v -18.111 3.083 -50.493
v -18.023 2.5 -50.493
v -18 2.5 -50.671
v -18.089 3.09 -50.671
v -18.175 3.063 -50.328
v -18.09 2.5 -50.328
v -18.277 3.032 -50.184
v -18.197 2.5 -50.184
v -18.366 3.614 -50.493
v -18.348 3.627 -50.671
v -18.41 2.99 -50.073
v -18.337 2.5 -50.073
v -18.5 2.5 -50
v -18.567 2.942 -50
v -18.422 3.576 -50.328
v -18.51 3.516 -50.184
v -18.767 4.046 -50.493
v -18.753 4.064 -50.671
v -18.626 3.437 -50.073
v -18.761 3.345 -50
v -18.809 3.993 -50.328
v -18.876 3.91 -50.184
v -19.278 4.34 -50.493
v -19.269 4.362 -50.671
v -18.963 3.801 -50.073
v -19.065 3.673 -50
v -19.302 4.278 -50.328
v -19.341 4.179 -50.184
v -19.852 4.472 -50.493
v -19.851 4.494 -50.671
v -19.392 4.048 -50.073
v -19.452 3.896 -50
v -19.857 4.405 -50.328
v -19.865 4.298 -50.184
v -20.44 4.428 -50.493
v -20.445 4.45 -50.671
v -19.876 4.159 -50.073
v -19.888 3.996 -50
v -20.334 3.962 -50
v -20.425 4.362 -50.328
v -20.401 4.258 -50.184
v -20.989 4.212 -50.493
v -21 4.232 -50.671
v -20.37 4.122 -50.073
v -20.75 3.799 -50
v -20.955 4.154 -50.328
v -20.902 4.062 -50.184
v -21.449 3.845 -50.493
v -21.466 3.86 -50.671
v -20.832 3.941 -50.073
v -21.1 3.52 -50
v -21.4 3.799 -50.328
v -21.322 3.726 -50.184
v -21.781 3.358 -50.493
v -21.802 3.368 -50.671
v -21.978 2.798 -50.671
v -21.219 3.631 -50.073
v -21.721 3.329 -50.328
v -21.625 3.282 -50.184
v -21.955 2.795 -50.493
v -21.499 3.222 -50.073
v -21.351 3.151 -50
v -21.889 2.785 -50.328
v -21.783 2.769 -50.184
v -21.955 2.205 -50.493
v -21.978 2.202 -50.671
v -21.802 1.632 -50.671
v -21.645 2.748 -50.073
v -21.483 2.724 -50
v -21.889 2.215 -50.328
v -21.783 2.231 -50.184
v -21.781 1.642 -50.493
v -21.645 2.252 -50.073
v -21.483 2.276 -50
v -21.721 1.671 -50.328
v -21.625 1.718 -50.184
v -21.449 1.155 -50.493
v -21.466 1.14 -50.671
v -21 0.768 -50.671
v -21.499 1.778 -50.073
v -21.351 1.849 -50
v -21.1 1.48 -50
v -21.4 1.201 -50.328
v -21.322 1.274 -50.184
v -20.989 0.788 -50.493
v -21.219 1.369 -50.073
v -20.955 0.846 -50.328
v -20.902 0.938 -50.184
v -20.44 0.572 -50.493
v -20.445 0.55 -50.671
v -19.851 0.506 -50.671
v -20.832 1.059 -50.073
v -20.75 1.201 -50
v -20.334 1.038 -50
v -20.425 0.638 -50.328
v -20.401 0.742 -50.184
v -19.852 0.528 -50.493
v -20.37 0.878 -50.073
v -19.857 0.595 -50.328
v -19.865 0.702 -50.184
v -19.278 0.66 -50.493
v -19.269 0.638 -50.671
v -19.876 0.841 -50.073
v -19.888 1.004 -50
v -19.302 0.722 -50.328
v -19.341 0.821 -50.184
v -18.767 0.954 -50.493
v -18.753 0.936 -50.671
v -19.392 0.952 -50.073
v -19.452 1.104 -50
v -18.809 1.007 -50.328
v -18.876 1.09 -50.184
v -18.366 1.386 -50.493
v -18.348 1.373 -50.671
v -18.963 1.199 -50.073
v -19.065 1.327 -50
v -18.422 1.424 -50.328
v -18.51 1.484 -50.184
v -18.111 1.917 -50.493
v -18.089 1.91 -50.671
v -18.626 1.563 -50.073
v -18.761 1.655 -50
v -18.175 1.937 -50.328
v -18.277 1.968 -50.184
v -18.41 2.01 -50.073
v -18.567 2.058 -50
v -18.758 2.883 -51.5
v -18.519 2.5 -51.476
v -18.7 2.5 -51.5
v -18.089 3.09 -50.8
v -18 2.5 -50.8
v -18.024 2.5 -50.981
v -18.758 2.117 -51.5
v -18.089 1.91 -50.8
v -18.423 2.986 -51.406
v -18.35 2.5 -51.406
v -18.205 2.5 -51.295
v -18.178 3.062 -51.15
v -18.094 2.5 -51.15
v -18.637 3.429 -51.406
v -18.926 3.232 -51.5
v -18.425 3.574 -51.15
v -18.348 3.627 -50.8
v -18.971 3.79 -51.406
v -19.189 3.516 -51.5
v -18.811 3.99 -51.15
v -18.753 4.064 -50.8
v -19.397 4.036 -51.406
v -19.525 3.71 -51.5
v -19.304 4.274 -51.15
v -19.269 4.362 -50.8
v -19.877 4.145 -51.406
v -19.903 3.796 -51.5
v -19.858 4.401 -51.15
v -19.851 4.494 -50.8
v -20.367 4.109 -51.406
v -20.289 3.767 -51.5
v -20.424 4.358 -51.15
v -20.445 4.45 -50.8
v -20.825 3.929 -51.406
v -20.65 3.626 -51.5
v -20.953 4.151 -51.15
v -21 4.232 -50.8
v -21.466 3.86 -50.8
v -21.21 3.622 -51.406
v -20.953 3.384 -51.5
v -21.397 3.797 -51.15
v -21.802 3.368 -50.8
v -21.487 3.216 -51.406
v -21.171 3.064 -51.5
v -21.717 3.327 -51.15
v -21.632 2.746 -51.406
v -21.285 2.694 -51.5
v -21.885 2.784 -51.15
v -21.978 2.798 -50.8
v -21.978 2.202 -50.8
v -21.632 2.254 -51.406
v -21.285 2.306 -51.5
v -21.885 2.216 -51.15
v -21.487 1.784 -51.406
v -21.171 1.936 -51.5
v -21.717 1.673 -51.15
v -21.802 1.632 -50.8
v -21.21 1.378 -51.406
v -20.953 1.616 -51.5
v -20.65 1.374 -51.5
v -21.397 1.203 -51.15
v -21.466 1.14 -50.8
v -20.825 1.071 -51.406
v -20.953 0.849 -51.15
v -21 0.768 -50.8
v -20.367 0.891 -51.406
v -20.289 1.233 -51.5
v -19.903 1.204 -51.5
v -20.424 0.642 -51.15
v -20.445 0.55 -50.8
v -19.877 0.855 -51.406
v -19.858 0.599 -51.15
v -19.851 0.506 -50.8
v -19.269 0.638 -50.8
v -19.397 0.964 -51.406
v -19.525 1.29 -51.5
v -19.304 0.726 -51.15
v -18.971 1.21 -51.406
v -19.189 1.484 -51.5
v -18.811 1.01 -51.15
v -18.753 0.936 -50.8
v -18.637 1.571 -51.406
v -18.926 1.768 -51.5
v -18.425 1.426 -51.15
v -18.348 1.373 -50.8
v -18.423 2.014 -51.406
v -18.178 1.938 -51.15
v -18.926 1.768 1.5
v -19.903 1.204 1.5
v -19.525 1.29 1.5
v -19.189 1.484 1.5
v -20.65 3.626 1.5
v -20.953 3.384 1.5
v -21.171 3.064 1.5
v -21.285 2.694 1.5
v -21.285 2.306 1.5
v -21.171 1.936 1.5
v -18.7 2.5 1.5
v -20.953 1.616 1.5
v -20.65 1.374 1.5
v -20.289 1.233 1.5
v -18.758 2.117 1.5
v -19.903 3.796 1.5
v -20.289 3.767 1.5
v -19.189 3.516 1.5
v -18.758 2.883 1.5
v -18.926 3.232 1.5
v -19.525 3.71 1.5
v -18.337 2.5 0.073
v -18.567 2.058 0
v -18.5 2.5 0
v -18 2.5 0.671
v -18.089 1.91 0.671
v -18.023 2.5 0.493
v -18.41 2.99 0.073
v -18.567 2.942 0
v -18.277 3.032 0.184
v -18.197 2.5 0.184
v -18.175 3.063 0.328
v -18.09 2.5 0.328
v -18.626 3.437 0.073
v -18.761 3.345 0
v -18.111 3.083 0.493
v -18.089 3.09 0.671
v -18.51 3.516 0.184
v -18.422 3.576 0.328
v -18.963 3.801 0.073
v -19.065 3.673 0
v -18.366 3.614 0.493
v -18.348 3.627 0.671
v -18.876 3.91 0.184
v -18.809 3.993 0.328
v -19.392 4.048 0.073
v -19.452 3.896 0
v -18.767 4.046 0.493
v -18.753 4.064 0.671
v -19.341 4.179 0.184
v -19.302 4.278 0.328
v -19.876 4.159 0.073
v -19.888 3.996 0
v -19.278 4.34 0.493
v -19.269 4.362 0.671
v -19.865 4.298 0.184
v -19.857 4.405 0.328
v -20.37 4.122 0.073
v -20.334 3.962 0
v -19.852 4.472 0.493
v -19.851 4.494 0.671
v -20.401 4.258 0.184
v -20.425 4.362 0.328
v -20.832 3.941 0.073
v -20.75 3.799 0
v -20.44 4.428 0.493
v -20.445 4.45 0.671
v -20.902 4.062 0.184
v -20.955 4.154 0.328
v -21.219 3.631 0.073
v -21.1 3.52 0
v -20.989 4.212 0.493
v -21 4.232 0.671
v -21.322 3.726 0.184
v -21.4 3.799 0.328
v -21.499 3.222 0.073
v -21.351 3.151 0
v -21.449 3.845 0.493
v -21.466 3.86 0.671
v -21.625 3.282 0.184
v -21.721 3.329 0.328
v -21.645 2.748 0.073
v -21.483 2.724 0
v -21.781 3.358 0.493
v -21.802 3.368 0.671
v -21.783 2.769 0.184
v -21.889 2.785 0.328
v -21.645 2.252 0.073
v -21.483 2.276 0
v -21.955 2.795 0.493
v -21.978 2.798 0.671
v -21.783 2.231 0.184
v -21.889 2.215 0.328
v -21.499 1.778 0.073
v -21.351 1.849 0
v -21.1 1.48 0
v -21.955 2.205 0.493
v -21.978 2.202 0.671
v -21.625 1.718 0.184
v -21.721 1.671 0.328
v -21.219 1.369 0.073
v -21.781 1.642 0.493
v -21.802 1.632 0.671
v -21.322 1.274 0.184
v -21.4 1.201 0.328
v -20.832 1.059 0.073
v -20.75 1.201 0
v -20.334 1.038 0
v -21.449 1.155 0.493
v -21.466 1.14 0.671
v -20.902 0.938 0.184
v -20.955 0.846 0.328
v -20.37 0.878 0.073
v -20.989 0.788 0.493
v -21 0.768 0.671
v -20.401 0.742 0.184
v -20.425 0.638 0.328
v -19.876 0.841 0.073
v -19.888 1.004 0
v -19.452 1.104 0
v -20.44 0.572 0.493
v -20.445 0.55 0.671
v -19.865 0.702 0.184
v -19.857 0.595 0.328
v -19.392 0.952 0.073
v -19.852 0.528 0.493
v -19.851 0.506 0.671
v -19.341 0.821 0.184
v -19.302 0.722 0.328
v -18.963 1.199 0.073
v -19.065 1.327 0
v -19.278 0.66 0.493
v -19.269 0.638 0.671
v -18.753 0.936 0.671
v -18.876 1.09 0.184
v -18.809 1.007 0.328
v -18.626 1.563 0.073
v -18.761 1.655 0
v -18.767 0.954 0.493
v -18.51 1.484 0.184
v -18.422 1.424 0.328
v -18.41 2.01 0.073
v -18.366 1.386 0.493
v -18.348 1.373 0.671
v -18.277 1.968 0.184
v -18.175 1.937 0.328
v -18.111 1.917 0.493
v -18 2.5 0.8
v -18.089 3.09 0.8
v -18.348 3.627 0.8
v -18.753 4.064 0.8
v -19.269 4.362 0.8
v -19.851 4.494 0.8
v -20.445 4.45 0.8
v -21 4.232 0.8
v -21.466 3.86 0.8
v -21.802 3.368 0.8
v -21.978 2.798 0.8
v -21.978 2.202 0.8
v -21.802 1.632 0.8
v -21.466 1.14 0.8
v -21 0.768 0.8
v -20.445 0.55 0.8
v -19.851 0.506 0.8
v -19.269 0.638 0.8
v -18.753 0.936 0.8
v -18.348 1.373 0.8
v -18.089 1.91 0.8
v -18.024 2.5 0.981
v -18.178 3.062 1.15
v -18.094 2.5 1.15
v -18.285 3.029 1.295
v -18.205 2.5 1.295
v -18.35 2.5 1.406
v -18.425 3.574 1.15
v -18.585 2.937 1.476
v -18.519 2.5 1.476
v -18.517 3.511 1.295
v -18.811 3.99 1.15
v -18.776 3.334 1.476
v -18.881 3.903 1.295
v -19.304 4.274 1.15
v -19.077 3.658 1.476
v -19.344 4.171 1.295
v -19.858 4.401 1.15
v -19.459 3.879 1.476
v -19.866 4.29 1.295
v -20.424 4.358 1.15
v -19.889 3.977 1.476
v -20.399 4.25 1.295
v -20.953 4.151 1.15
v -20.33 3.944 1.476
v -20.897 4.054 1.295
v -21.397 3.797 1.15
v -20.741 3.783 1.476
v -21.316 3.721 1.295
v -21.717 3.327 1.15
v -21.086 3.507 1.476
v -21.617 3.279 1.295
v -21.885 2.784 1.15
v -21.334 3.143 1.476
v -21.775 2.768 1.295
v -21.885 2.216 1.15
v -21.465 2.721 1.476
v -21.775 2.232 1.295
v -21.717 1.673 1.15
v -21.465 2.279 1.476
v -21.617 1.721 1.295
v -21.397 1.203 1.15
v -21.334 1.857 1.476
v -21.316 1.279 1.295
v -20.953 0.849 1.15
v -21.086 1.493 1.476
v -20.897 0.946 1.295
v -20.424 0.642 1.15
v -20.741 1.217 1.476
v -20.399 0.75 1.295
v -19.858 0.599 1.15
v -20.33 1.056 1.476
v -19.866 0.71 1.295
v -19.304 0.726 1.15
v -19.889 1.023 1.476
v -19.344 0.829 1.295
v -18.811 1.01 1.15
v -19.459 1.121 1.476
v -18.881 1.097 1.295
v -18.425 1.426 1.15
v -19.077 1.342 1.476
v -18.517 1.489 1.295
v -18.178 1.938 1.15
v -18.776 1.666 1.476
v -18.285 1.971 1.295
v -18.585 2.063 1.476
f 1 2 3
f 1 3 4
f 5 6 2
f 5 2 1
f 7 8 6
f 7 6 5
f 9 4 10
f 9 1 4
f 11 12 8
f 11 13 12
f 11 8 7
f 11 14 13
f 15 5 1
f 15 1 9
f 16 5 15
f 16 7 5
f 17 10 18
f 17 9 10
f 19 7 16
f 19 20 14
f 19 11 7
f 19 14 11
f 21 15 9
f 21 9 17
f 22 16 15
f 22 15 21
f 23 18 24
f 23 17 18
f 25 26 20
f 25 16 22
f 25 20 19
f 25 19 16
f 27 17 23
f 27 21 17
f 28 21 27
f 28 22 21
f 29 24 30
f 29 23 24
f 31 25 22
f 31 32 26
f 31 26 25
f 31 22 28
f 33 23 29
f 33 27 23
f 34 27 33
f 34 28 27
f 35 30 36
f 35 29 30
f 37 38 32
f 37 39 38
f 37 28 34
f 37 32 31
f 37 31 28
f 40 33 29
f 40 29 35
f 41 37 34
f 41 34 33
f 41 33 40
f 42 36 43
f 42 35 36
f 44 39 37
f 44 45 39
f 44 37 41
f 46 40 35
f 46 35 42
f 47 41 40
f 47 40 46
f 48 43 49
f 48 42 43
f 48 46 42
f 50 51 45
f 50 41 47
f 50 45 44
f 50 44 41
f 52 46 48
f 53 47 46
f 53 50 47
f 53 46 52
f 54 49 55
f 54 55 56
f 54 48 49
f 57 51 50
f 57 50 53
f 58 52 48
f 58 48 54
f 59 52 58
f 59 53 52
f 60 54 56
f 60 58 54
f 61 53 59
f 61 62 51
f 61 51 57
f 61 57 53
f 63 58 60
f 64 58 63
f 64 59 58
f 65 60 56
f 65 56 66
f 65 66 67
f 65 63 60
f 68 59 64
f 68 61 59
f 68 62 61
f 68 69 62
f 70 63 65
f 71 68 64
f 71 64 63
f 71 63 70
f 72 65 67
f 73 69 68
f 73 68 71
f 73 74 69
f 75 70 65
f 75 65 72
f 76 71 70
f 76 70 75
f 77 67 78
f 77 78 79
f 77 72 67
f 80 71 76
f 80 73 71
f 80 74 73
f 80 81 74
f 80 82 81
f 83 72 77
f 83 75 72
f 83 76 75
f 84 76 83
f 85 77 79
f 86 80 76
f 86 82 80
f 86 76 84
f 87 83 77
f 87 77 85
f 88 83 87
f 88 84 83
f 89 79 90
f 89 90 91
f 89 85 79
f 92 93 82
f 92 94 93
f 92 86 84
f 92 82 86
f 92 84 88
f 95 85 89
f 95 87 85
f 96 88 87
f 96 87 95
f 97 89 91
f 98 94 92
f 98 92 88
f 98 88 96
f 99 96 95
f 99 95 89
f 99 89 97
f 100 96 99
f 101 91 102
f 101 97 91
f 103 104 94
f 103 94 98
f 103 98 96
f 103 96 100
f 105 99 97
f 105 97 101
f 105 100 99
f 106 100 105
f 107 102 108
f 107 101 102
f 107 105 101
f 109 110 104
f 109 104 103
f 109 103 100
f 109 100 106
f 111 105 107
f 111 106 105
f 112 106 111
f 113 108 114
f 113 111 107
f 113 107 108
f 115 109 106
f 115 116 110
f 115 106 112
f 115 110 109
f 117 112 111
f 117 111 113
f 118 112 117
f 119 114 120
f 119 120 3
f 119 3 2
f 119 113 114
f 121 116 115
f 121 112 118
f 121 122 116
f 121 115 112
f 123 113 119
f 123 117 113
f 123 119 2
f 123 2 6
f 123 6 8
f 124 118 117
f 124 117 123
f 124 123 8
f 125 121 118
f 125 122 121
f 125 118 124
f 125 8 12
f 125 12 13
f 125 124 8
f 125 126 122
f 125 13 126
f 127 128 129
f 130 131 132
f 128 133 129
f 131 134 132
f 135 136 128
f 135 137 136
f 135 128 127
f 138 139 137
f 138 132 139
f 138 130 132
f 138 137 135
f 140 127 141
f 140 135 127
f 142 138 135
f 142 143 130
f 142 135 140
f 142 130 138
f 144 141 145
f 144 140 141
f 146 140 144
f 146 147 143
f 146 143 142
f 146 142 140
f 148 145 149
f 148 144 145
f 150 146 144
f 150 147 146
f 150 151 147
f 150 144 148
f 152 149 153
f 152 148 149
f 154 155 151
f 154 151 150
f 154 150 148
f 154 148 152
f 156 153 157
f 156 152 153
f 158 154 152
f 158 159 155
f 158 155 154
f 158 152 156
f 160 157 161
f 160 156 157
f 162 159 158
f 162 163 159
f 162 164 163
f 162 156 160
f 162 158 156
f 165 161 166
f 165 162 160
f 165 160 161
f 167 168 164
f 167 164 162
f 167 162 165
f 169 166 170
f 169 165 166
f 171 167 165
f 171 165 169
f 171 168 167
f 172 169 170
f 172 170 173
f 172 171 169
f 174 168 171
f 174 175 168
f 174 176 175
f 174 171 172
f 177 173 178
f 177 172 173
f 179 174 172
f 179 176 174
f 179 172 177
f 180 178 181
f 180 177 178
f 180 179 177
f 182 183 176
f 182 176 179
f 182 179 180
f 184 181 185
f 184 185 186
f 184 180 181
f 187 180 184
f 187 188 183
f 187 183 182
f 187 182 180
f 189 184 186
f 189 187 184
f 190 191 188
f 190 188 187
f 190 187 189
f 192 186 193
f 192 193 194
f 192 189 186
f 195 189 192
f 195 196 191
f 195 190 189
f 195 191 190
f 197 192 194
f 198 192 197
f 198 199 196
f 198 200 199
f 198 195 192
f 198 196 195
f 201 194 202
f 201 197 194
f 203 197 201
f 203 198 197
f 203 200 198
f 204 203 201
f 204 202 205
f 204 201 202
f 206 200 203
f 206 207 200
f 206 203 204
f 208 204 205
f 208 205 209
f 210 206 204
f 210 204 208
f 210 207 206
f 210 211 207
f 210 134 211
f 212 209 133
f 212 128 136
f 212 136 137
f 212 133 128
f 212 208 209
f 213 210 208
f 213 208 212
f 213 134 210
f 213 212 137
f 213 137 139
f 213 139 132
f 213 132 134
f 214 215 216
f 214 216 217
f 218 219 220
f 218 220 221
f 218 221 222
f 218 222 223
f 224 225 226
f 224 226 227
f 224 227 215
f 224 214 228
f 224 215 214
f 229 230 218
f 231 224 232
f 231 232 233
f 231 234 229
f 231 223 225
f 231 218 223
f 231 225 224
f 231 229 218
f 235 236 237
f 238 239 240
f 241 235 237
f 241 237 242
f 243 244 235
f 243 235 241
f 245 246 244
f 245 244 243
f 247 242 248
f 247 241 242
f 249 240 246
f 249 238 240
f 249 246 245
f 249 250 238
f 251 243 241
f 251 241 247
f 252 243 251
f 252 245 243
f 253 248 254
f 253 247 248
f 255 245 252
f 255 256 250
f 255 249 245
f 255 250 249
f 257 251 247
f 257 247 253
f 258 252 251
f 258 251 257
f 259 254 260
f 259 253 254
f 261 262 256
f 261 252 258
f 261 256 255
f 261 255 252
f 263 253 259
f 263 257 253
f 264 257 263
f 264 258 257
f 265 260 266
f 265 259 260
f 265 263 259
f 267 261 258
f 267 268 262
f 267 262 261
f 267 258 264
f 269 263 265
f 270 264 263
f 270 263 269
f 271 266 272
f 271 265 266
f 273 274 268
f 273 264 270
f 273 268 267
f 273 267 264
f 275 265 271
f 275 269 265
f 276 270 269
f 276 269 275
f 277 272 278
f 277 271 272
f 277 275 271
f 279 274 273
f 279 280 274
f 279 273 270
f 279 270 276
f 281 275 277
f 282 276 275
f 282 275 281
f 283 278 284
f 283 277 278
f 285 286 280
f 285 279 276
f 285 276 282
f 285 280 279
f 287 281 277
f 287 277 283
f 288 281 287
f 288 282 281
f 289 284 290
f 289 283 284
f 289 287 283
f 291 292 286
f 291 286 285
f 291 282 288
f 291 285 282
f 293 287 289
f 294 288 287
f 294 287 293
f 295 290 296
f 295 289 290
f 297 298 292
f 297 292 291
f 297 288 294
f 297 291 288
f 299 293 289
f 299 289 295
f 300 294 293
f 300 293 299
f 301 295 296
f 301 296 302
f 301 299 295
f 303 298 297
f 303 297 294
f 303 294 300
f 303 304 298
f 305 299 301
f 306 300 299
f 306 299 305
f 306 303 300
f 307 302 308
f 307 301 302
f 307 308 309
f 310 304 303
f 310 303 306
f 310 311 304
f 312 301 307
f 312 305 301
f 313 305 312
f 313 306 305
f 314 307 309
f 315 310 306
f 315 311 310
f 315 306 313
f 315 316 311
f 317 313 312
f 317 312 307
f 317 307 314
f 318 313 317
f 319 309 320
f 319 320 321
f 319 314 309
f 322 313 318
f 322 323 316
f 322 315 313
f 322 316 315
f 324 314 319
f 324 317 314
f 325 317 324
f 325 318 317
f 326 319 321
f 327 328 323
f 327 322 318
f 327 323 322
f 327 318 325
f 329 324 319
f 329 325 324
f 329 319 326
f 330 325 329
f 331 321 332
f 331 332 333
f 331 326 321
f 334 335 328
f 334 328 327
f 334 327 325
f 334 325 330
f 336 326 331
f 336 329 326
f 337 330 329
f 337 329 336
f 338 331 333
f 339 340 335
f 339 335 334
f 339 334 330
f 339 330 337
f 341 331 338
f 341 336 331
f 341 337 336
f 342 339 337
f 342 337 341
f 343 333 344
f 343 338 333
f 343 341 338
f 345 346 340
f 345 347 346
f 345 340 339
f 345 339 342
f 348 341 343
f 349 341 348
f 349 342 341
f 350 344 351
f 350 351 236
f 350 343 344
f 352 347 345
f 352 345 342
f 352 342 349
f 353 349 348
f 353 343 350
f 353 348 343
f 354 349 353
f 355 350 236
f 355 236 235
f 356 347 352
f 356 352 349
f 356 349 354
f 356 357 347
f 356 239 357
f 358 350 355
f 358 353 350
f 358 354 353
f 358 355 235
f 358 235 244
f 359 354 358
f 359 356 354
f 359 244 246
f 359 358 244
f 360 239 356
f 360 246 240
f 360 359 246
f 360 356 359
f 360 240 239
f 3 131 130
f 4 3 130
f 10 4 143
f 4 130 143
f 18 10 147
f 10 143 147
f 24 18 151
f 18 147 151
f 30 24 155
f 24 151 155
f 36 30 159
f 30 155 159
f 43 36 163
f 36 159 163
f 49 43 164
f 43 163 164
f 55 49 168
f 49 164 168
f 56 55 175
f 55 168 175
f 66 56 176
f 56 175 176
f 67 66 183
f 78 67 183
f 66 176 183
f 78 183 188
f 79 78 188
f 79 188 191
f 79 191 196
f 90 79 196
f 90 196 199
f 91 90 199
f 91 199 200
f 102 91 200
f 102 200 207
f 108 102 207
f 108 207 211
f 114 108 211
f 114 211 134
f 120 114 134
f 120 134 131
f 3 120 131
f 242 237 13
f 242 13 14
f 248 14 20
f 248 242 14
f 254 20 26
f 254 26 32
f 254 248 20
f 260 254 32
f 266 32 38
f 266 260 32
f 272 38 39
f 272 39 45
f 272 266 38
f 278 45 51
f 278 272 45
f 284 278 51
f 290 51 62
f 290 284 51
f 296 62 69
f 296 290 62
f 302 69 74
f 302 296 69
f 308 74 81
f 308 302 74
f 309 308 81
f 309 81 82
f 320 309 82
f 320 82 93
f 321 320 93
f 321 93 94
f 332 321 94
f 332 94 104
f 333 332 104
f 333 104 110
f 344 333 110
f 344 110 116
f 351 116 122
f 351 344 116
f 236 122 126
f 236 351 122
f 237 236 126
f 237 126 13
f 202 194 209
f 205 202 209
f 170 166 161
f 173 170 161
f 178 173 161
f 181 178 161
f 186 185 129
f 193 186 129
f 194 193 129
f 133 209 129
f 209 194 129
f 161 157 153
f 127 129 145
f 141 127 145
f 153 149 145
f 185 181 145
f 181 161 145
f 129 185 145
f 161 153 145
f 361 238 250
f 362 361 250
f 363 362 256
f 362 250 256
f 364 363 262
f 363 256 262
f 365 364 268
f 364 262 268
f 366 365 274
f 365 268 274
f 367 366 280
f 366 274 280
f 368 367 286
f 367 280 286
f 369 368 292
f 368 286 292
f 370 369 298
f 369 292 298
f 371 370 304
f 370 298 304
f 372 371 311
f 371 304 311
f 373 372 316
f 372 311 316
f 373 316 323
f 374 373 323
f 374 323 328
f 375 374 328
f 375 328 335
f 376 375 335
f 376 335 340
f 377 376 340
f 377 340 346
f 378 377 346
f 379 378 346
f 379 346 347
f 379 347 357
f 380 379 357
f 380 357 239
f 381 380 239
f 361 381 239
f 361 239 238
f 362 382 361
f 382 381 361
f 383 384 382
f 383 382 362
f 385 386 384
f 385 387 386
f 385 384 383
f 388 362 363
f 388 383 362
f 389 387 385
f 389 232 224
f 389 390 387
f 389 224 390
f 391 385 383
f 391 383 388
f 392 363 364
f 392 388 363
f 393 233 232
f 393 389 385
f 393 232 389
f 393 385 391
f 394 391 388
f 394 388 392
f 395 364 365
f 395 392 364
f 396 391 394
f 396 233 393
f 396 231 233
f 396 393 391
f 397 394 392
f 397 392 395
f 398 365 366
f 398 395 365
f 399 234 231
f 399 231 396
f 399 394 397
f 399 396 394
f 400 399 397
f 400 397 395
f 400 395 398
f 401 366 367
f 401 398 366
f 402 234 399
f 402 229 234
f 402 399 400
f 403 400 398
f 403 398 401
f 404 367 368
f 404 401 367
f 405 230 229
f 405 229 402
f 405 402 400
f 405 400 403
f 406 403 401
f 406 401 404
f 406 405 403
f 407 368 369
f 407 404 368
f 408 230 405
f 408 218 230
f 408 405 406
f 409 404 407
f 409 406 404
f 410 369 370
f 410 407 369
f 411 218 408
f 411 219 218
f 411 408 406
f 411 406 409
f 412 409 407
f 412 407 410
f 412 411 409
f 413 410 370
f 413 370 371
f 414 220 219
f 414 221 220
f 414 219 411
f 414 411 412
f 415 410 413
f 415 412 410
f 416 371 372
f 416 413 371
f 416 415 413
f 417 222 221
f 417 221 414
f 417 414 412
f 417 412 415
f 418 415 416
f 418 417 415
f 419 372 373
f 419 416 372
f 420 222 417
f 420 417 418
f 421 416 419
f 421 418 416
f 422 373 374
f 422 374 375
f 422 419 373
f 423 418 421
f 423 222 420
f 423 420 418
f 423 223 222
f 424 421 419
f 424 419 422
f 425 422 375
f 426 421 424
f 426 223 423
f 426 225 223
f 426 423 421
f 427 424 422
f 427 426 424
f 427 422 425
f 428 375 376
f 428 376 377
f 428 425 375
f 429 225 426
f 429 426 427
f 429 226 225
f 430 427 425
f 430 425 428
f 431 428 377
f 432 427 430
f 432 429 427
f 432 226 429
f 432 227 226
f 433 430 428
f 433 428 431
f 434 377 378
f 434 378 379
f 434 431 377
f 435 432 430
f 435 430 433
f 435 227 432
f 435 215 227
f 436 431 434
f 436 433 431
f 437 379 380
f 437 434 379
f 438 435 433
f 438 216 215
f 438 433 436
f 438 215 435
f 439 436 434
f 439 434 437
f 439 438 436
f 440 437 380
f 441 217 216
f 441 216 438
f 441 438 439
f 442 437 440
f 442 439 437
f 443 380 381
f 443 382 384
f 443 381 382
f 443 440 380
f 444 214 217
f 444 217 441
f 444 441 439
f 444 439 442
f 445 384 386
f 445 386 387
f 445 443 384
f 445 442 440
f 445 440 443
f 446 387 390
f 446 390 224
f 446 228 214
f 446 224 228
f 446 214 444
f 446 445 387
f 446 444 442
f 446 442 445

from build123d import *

# Parameters (mm, degrees)
ESBO_O1_R                = 1.5
RESSALTO_EXTRUS_O1_DEPTH = 50
ESBO_O2_R                = 2
RESSALTO_EXTRUS_O2_DEPTH = 1.5
RESSALTO_EXTRUS_O3_START = -51.5
ESBO_O2_2_R              = 2
RESSALTO_EXTRUS_O3_DEPTH = 1.5
FILETE1_R                = 0.7


with BuildPart() as part:
    # Esboço1 → Ressalto-extrusão1 (new body)
    with BuildSketch(Plane.XY):
        with Locations((-20, 2.5)):
            Circle(ESBO_O1_R)
    extrude(amount=-RESSALTO_EXTRUS_O1_DEPTH)

    # Esboço2 → Ressalto-extrusão2 (add)
    with BuildSketch(Plane.XY):
        with Locations((-20, 2.5)):
            Circle(ESBO_O2_R)
    extrude(amount=RESSALTO_EXTRUS_O2_DEPTH)

    # Esboço2<2> → Ressalto-extrusão3 (add)
    with BuildSketch(Plane.XY.offset(RESSALTO_EXTRUS_O3_START)):
        with Locations((-20, 2.5)):
            Circle(ESBO_O2_2_R)
    extrude(amount=RESSALTO_EXTRUS_O3_DEPTH)

    # Filete1
    # the kernel refuses this fillet: 0.7 mm, written as the material it takes off along each edge
    with BuildSketch(Plane(origin=(-20, 2.5, 0), x_dir=(1, 0, 0), z_dir=(0, -1, 0))) as filete1_piece_1:
        with BuildLine():
            CenterArc((1.3, 0.670820393), FILETE1_R, 286.601549599, 73.398450401)
            Line((2, 0.670820393), (2.014, 0.670820393))
            Line((2.014, 0.670820393), (2.014, 0))
            Line((2.014, 0), (2, -0.014))
            ThreePointArc((2, -0.014), (1.75, -0.014), (1.504, -0.013416408))
            Line((1.504, -0.013416408), (1.5, 0))
        make_face()
    revolve(axis=Axis((-20, 2.5, 0), (0, 0, 1)), mode=Mode.SUBTRACT)
    with BuildSketch(Plane(origin=(-20, 2.5, 1.5), x_dir=(1, 0, 0), z_dir=(0, -1, 0))) as filete1_piece_2:
        with BuildLine():
            CenterArc((2 - FILETE1_R, -FILETE1_R), FILETE1_R, 0, 90)
            Line((2 - FILETE1_R, 0), (2 - FILETE1_R, FILETE1_R * 0.02))
            Line((2 - FILETE1_R, FILETE1_R * 0.02), (2 + FILETE1_R * 0.02, FILETE1_R * 0.02))
            Line((2 + FILETE1_R * 0.02, FILETE1_R * 0.02), (2 + FILETE1_R * 0.02, -FILETE1_R))
            Line((2 + FILETE1_R * 0.02, -FILETE1_R), (2, -FILETE1_R))
        make_face()
    revolve(axis=Axis((-20, 2.5, 1.5), (0, 0, 1)), mode=Mode.SUBTRACT)
    with BuildSketch(Plane(origin=(-20, 2.5, -50), x_dir=(1, 0, 0), z_dir=(0, -1, 0))) as filete1_piece_3:
        with BuildLine():
            CenterArc((1.3, -0.670820393), FILETE1_R, 0, 73.398450401)
            Line((1.5, 0), (1.504, 0.013416408))
            ThreePointArc((1.504, 0.013416408), (1.75, 0.014), (2, 0.014))
            Line((2, 0.014), (2.014, 0))
            Line((2.014, 0), (2.014, -0.670820393))
            Line((2.014, -0.670820393), (2, -0.670820393))
        make_face()
    revolve(axis=Axis((-20, 2.5, -50), (0, 0, 1)), mode=Mode.SUBTRACT)
    with BuildSketch(Plane(origin=(-20, 2.5, -51.5), x_dir=(1, 0, 0), z_dir=(0, -1, 0))) as filete1_piece_4:
        with BuildLine():
            CenterArc((2 - FILETE1_R, FILETE1_R), FILETE1_R, 270, 90)
            Line((2 - FILETE1_R, 0), (2 - FILETE1_R, -FILETE1_R * 0.02))
            Line((2 - FILETE1_R, -FILETE1_R * 0.02), (2 + FILETE1_R * 0.02, -FILETE1_R * 0.02))
            Line((2 + FILETE1_R * 0.02, -FILETE1_R * 0.02), (2 + FILETE1_R * 0.02, FILETE1_R))
            Line((2 + FILETE1_R * 0.02, FILETE1_R), (2, FILETE1_R))
        make_face()
    revolve(axis=Axis((-20, 2.5, -51.5), (0, 0, 1)), mode=Mode.SUBTRACT)


solid = part.part
